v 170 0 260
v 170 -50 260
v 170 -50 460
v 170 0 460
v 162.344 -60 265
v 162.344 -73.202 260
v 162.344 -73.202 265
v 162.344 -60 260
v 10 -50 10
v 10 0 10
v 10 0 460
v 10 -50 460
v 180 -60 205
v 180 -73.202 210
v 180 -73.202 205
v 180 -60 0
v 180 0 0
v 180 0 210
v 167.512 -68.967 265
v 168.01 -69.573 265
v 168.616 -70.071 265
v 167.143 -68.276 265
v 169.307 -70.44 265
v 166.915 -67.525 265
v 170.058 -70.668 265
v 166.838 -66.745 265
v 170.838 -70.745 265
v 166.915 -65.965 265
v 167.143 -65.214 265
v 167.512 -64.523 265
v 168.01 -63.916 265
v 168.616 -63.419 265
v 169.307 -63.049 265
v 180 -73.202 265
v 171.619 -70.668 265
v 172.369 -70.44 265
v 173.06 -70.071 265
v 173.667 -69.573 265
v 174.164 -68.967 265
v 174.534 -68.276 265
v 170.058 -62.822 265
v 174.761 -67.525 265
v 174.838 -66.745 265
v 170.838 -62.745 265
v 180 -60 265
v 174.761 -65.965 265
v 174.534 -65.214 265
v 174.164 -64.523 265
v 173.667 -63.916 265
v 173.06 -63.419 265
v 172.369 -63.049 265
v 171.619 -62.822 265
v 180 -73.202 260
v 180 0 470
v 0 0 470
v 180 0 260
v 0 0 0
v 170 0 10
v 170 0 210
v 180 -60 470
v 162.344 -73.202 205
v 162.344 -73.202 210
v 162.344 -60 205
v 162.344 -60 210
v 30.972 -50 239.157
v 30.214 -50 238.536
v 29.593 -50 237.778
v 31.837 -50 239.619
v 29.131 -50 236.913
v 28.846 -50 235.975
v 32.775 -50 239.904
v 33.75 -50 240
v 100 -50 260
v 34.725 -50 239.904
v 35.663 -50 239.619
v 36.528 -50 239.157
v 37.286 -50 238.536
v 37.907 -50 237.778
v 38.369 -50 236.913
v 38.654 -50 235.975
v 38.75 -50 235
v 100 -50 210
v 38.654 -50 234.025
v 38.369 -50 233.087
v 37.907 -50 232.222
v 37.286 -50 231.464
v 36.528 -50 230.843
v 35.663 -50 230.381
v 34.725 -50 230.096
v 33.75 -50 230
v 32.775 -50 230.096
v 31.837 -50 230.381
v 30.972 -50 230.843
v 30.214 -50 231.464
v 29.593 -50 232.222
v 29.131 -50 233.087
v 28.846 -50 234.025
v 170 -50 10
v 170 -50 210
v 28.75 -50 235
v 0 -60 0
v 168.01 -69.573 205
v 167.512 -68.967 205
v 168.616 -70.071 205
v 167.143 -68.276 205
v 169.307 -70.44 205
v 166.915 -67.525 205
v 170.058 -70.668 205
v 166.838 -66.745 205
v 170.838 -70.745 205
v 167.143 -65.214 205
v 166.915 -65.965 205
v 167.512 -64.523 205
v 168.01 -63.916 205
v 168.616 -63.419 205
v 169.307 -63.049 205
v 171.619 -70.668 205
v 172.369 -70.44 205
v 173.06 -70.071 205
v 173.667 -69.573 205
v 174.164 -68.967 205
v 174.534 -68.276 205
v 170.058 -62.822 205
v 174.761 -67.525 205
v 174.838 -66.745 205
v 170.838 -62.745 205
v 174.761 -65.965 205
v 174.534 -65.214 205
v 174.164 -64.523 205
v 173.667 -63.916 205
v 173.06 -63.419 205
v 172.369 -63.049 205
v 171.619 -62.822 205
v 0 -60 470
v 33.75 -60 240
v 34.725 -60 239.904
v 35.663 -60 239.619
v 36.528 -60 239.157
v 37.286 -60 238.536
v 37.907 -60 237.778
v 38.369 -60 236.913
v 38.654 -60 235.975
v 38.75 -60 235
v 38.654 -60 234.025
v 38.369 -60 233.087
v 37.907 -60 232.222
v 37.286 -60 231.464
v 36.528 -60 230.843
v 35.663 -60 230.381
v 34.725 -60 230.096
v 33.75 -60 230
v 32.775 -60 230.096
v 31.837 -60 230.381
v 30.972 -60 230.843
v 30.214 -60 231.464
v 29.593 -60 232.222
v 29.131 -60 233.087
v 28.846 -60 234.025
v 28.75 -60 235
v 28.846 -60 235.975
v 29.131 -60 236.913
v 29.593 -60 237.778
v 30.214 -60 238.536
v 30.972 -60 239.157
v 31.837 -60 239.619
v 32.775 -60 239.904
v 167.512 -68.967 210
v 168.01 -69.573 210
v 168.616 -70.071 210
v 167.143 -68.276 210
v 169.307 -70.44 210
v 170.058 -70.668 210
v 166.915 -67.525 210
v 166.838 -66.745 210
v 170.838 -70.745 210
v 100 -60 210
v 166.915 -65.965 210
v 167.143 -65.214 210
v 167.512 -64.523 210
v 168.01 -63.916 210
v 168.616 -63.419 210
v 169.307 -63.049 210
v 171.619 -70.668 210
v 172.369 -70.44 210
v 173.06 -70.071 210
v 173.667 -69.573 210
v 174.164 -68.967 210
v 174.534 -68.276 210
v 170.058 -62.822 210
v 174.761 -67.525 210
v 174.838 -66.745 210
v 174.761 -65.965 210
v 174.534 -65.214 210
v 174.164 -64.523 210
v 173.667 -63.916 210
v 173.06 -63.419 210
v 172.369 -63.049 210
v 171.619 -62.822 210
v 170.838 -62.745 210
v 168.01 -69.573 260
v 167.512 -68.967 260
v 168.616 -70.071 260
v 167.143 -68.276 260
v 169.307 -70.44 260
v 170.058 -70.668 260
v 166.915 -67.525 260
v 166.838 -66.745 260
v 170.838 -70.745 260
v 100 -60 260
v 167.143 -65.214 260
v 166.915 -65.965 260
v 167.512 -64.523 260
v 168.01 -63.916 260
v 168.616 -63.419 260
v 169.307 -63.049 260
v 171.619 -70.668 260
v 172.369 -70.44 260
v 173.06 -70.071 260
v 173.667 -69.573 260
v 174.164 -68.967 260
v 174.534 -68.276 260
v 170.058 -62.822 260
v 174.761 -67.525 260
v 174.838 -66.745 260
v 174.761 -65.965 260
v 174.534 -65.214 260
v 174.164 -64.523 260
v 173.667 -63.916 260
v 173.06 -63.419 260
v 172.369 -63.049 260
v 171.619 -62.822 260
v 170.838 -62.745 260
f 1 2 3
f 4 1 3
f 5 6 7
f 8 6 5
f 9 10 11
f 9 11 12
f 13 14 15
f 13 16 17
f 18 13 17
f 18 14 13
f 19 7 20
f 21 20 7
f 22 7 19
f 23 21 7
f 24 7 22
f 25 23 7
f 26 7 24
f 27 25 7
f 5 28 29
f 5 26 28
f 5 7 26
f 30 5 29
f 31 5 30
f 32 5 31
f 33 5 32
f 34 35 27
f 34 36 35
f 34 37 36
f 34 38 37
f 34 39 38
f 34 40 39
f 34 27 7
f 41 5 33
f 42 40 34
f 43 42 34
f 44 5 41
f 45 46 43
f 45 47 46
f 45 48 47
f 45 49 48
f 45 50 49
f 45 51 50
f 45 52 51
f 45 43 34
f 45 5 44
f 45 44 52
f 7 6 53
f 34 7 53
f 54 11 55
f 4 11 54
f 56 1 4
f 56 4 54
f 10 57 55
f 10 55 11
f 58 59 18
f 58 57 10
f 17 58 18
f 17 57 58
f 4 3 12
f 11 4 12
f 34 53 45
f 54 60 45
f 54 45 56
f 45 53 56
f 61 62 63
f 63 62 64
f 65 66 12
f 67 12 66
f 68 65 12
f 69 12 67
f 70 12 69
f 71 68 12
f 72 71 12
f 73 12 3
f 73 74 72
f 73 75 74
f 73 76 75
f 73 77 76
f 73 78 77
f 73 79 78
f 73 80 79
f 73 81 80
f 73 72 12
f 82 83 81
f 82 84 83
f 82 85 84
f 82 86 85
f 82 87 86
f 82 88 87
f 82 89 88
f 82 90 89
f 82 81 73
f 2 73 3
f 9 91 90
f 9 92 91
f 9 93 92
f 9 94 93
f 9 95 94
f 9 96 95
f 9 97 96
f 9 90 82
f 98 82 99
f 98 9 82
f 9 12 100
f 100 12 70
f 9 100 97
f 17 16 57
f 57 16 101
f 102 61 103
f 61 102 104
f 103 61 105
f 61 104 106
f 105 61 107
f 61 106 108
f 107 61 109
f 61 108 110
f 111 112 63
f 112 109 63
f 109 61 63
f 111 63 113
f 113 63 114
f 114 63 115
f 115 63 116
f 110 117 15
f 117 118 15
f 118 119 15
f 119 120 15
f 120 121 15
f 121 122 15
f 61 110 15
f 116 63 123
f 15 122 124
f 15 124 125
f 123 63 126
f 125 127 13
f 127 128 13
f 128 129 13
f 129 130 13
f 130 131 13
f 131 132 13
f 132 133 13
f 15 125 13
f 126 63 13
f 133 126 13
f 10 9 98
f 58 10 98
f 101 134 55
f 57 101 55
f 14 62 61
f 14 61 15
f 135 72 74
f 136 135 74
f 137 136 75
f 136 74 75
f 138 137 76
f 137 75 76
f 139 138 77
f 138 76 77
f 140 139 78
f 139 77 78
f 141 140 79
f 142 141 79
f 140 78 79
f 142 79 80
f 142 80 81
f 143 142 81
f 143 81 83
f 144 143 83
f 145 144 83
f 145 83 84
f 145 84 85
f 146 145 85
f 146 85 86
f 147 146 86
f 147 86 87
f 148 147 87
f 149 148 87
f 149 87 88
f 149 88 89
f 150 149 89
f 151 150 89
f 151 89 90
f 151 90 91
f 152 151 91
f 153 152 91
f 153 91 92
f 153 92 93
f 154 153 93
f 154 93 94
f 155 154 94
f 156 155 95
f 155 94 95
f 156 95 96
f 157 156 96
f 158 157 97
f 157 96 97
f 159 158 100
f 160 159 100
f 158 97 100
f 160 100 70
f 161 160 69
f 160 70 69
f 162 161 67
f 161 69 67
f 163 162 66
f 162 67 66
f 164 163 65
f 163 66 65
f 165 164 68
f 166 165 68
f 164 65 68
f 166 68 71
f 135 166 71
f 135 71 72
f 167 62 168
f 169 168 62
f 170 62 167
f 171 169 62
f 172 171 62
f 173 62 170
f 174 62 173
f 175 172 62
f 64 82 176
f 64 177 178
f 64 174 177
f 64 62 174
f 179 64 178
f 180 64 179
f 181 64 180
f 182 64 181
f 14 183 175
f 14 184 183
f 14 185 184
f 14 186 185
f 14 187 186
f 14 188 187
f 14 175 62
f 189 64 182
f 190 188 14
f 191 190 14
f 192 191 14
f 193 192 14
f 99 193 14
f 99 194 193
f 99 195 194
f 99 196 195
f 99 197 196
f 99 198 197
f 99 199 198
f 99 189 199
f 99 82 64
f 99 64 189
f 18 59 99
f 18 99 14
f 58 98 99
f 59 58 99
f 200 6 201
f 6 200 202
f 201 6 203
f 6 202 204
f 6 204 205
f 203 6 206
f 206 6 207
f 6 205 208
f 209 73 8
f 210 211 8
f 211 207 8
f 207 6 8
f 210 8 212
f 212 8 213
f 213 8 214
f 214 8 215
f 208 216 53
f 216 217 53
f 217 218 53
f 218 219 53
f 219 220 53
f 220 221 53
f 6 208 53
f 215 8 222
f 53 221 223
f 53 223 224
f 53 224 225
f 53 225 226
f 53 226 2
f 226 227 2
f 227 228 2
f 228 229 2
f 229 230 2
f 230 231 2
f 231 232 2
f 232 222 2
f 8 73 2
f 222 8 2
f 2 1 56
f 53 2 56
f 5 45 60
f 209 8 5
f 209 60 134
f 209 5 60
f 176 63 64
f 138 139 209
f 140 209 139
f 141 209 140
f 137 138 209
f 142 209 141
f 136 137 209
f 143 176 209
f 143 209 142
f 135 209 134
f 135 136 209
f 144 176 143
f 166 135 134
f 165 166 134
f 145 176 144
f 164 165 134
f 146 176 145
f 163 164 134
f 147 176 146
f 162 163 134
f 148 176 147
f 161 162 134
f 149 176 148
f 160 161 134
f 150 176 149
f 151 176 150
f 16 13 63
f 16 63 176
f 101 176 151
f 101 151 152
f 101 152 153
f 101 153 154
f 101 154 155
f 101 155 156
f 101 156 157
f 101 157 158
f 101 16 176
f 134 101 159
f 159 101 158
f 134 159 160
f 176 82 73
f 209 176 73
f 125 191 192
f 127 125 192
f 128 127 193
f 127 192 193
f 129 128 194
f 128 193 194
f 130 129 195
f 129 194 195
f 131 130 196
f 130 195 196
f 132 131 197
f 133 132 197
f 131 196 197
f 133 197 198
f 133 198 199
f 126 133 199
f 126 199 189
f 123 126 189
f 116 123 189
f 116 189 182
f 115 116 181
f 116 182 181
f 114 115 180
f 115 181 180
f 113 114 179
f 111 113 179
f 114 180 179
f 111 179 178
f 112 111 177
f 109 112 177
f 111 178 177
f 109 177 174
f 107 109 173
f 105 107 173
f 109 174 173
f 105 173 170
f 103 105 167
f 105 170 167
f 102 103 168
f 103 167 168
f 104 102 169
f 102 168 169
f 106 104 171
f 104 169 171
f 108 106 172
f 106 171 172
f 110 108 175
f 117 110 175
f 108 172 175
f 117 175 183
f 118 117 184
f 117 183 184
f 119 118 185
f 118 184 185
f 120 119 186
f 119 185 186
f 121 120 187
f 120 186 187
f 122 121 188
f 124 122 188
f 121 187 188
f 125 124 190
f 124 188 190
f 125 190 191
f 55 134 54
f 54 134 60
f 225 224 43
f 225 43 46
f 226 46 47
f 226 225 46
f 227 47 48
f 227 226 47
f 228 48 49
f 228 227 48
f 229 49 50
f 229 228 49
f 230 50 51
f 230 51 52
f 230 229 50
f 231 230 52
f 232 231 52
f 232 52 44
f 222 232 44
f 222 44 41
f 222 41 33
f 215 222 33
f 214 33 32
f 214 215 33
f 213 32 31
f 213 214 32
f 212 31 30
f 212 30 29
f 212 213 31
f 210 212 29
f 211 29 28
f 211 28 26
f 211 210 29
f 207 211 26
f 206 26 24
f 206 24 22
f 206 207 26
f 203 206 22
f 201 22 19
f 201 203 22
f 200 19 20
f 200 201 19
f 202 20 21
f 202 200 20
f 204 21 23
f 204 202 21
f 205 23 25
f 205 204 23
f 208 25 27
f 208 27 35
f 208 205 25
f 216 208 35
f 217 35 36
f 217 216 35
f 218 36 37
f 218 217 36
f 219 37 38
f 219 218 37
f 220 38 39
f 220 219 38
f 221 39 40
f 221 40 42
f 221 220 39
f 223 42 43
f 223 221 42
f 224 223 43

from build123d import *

# Parameters (mm, degrees)
BOSS_EXTRUDE1_DEPTH = 470
SKETCH2_R           = 5
CUT_EXTRUDE1_DEPTH  = 506.766744656
BOSS_EXTRUDE2_DEPTH = 50
SKETCH4_W           = 70
SKETCH4_H           = 25
SKETCH4_W_2         = 10
CUT_EXTRUDE2_DEPTH  = 80
SKETCH6_W           = 17.656216206
SKETCH6_H           = 13.202094069
SKETCH6_R           = 4
BOSS_EXTRUDE3_DEPTH = 5


with BuildPart() as part:
    # Sketch1 → Boss-Extrude1 (new body)
    with BuildSketch(Plane.XY):
        Polygon((180, -50), (180, -60), (0, -60), (0, 0), (10, 0), (10, -50), align=None)
    extrude(amount=BOSS_EXTRUDE1_DEPTH)

    # Sketch2 → Cut-Extrude1 (cut, through all)
    with BuildSketch(Plane(origin=(0, -50, 0), x_dir=(1, 0, 0), z_dir=(0, 1, 0))):
        with Locations(Location((33.75, -235, 0), (0, 0, 270))):
            Circle(SKETCH2_R)
    extrude(amount=-CUT_EXTRUDE1_DEPTH, mode=Mode.SUBTRACT)

    # Sketch3 → Boss-Extrude2 (add)
    with BuildSketch(Plane(origin=(0, -50, 0), x_dir=(1, 0, 0), z_dir=(0, 1, 0))):
        Polygon((10, -460), (10, -470), (180, -470), (180, 0), (10, 0), (10, -10), (170, -10), (170, -460), align=None)
    extrude(amount=BOSS_EXTRUDE2_DEPTH)

    # Sketch4 → Cut-Extrude2 (cut, symmetric)
    with BuildSketch(Plane(origin=(0, -50, 0), x_dir=(1, 0, 0), z_dir=(0, 1, 0))):
        with Locations((135, -222.5)):
            Rectangle(SKETCH4_W, SKETCH4_H)
        with Locations((135, -247.5)):
            Rectangle(SKETCH4_W, SKETCH4_H)
        with Locations((175, -222.5)):
            Rectangle(SKETCH4_W_2, SKETCH4_H)
        with Locations((175, -247.5)):
            Rectangle(SKETCH4_W_2, SKETCH4_H)
    extrude(amount=CUT_EXTRUDE2_DEPTH, both=True, mode=Mode.SUBTRACT)

    # Sketch6 → Boss-Extrude3 (add)
    with BuildSketch(Plane.XY.offset(210)):
        with Locations((171.171891897, -66.601047034)):
            Rectangle(SKETCH6_W, SKETCH6_H)
        with Locations((170.838161539, -66.744917763)):
            Circle(SKETCH6_R, mode=Mode.SUBTRACT)
    boss_extrude3 = extrude(amount=-BOSS_EXTRUDE3_DEPTH)

    # Mirror1: Boss-Extrude3 across plane
    add(boss_extrude3.mirror(Plane.XY.offset(235)))


solid = part.part
